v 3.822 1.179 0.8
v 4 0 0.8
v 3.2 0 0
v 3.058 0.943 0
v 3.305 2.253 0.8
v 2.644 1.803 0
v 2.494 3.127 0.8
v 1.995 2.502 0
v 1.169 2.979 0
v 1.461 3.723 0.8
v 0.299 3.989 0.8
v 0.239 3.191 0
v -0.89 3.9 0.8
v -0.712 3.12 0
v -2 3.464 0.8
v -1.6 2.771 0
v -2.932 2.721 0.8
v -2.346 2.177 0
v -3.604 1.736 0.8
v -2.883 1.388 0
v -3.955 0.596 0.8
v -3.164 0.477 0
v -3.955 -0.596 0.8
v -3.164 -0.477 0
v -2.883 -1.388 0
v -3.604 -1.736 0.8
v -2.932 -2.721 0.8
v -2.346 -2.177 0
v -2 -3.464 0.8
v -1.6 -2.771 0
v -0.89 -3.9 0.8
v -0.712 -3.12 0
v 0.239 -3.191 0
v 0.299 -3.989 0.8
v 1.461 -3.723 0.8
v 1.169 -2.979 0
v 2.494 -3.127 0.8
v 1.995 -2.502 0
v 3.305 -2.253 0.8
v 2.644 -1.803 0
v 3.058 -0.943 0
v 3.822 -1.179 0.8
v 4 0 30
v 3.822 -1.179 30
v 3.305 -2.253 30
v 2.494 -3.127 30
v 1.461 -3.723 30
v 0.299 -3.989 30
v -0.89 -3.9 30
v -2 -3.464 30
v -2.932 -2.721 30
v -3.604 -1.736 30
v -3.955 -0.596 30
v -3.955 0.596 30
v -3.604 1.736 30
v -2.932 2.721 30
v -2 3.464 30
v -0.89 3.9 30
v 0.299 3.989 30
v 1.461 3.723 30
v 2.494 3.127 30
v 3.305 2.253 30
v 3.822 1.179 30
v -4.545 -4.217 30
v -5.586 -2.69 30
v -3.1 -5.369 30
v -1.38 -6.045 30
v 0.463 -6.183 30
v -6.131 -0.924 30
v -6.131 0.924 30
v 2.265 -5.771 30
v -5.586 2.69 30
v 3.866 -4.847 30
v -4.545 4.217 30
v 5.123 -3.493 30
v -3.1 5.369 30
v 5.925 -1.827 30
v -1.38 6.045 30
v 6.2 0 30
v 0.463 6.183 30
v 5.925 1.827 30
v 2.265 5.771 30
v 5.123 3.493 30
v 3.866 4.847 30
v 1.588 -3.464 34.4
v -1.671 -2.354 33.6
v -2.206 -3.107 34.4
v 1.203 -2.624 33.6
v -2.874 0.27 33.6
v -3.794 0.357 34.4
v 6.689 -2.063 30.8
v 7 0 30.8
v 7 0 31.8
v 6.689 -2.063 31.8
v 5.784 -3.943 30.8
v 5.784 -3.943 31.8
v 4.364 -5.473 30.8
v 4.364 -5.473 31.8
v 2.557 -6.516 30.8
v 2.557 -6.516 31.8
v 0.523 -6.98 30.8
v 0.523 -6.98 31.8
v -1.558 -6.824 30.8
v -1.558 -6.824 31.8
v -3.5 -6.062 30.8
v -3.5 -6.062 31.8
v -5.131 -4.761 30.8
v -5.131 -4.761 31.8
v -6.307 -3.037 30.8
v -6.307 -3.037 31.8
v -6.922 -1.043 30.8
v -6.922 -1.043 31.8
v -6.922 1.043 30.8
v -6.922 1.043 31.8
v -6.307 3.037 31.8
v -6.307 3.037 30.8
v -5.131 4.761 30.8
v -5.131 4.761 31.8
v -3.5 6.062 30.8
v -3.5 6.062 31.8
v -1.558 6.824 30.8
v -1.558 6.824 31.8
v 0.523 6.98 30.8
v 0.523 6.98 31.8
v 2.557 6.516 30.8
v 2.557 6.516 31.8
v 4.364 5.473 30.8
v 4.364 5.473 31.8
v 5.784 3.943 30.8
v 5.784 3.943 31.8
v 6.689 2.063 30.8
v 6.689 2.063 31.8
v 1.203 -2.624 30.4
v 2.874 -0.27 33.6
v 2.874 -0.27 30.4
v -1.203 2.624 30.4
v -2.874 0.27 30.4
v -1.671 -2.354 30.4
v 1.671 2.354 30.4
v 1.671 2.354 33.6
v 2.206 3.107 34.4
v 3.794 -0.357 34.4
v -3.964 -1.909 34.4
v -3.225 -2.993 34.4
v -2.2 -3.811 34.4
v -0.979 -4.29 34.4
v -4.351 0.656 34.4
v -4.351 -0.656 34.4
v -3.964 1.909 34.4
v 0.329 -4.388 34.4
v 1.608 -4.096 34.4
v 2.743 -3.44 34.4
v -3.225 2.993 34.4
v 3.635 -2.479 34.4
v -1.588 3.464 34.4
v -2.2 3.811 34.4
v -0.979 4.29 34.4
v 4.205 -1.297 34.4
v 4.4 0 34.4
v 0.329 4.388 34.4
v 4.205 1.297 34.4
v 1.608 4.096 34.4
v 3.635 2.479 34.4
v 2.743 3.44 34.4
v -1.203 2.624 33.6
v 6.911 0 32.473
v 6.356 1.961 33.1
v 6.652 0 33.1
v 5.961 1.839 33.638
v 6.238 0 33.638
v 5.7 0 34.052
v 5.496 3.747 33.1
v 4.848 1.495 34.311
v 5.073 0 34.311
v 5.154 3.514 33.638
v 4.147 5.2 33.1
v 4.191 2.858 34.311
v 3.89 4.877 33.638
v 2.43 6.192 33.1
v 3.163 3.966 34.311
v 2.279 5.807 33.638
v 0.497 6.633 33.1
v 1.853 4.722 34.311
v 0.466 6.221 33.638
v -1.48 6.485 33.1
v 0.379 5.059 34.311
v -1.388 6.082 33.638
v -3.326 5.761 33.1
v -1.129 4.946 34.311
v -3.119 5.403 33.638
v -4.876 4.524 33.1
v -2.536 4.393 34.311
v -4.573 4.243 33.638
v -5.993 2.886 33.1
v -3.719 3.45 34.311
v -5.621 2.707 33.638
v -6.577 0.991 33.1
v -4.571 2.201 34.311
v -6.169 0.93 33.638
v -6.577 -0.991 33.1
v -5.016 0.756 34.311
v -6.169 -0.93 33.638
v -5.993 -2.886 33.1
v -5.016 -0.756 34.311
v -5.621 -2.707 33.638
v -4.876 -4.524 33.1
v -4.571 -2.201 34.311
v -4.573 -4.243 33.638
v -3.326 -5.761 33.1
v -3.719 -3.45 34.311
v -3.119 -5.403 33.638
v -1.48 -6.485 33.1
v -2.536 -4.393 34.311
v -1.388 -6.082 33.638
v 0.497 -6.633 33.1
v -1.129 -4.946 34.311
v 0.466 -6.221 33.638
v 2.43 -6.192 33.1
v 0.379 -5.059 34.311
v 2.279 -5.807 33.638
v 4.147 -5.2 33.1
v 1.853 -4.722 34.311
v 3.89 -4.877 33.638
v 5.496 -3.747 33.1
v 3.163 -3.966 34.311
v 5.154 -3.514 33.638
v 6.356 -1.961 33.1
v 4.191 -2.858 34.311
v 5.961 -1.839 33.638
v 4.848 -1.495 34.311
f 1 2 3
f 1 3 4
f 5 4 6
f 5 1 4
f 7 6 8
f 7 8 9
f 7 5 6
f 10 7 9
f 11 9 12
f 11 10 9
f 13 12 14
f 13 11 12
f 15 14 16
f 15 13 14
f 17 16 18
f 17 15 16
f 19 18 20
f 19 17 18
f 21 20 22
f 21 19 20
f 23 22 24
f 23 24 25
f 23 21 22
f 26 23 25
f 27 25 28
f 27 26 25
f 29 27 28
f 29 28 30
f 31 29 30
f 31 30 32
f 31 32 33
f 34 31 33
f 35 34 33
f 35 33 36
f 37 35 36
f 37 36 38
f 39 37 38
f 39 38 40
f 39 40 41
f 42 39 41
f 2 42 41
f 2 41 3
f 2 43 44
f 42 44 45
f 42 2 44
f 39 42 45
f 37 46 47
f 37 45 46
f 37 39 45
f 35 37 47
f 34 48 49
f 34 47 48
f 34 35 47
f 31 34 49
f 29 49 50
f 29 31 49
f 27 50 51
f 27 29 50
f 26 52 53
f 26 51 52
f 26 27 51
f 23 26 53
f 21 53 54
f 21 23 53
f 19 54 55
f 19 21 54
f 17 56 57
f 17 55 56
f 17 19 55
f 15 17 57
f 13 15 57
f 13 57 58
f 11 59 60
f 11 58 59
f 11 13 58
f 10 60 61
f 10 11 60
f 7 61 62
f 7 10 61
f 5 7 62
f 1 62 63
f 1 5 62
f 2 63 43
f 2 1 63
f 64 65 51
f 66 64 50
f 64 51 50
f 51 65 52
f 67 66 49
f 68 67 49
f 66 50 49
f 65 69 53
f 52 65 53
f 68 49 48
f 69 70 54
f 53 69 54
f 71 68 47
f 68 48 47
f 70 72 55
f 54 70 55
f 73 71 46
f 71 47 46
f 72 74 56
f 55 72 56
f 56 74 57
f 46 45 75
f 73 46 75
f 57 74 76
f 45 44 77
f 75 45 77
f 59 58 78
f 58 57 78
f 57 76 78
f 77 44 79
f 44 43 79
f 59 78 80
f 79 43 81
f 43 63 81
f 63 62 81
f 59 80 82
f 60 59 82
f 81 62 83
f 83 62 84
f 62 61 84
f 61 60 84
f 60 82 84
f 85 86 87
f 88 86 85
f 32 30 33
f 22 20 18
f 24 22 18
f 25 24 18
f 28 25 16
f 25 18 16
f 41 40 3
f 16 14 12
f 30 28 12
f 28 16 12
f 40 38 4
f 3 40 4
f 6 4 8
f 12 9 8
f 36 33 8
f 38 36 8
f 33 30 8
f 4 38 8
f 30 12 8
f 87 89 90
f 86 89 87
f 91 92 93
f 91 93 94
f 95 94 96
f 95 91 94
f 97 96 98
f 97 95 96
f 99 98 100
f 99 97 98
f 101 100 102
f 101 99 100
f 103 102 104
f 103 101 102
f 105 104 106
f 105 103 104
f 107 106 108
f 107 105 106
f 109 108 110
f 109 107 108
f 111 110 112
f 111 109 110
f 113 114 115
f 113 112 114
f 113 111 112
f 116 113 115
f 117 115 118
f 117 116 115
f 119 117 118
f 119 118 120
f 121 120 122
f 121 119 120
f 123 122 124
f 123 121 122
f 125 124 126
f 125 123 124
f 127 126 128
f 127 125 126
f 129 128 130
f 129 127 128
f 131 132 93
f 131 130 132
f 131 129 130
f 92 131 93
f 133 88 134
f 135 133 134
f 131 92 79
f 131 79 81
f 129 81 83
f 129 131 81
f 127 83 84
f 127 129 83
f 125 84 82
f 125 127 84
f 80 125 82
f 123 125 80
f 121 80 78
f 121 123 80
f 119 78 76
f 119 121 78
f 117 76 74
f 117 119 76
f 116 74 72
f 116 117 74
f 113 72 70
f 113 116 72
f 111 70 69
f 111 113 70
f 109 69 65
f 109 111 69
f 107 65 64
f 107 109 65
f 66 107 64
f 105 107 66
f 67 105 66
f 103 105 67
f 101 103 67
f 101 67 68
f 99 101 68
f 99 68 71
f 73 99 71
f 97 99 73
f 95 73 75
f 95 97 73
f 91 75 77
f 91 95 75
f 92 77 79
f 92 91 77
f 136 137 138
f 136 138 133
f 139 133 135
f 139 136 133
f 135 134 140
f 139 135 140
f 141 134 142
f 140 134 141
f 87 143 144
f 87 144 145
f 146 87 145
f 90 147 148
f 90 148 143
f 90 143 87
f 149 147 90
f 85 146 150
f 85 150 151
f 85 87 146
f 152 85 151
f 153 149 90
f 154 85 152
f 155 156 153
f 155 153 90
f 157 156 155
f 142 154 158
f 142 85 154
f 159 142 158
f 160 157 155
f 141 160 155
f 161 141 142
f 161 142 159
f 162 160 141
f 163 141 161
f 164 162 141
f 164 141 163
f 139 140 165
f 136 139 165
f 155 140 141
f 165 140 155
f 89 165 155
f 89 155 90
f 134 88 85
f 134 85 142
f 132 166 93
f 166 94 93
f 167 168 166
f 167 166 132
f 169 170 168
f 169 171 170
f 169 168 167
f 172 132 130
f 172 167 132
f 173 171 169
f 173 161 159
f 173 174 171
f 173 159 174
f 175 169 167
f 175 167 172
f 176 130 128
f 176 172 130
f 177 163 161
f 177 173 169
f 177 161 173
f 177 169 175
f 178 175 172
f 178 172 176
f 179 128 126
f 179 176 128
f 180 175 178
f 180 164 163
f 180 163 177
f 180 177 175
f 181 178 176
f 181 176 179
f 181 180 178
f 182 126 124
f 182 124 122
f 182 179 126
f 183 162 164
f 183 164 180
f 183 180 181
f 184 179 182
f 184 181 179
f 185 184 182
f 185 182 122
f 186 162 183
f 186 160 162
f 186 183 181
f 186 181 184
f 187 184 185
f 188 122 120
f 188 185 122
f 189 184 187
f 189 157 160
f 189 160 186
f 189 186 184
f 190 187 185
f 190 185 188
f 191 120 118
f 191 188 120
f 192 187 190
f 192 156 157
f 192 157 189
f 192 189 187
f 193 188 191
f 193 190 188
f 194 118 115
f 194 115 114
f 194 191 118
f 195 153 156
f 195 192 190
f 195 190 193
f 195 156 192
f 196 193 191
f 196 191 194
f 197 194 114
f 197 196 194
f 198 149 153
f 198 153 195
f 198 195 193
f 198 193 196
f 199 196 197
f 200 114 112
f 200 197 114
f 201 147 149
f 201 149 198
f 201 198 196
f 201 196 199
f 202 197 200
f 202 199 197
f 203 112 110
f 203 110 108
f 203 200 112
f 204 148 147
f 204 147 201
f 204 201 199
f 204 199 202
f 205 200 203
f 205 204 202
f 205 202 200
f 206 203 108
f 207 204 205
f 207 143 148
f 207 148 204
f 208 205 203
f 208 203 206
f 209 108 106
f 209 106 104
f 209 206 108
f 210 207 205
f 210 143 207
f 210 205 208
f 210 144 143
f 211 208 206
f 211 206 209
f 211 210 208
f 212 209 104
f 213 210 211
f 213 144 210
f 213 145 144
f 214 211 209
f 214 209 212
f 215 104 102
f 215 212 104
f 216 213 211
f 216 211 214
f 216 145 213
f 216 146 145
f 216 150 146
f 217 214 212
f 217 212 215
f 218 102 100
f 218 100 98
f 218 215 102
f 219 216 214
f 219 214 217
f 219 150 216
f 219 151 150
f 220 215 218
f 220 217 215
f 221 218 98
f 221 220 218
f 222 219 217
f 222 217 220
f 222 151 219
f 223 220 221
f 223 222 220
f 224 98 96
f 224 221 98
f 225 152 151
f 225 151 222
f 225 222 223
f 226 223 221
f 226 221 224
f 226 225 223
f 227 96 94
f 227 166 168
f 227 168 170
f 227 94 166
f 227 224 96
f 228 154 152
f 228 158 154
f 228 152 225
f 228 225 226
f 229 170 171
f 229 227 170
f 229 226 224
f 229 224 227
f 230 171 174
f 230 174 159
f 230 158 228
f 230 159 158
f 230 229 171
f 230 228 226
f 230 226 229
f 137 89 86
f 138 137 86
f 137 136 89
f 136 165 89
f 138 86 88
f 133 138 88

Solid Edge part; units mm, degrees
sketch "Sketch1" plane through (0, 0, 0) normal (0, -1, 0) x (1, 0, 0)
  line L0 (4, 30) -> (4, 0)
  line L1 (4, 0) -> (0, 0)
  line L2 (0, 0) -> (0, 34.4)
  line L3 (0, 34.4) -> (7, 34.4)
  line L4 (7, 34.4) -> (7, 30)
  line L5 (7, 30) -> (4, 30)
revolve "RevolvedProtrusion1" add sketch "Sketch1" angle 360 about axis through (0, 0, 0) along (0, 0, 1)
sketch "Sketch2" plane through (0, 0, 34.4) normal (0, 0, 1) x (1, 0, 0)
  line L0 (1.2028, -2.6242) -> (2.8741, -0.2704)
  line L1 (2.8741, -0.2704) -> (1.6712, 2.3538)
  line L2 (1.6712, 2.3538) -> (-1.2028, 2.6242)
  line L3 (-1.2028, 2.6242) -> (-2.8741, 0.2704)
  line L4 (-2.8741, 0.2704) -> (-1.6712, -2.3538)
  line L5 (-1.6712, -2.3538) -> (1.2028, -2.6242)
extrude "Cutout1" cut sketch "Sketch2" against normal blind 4
cosmetic_thread "Thread1" size "M8"
chamfer "Chamfer1" distance 0.8 angle 45 8 edges at (0.2342, 2.489, 34.4) (2.0384, -1.4473, 34.4) (-2.2726, -1.0417, 34.4) (-0.2342, -2.489, 34.4) (-2.0384, 1.4473, 34.4) (-4, 0, 0) (2.2726, 1.0417, 34.4) (-7, 0, 30)
fillet "Round1" radius 2.6 1 edges at (-7, 0, 34.4)
properties material "Stainless steel"
